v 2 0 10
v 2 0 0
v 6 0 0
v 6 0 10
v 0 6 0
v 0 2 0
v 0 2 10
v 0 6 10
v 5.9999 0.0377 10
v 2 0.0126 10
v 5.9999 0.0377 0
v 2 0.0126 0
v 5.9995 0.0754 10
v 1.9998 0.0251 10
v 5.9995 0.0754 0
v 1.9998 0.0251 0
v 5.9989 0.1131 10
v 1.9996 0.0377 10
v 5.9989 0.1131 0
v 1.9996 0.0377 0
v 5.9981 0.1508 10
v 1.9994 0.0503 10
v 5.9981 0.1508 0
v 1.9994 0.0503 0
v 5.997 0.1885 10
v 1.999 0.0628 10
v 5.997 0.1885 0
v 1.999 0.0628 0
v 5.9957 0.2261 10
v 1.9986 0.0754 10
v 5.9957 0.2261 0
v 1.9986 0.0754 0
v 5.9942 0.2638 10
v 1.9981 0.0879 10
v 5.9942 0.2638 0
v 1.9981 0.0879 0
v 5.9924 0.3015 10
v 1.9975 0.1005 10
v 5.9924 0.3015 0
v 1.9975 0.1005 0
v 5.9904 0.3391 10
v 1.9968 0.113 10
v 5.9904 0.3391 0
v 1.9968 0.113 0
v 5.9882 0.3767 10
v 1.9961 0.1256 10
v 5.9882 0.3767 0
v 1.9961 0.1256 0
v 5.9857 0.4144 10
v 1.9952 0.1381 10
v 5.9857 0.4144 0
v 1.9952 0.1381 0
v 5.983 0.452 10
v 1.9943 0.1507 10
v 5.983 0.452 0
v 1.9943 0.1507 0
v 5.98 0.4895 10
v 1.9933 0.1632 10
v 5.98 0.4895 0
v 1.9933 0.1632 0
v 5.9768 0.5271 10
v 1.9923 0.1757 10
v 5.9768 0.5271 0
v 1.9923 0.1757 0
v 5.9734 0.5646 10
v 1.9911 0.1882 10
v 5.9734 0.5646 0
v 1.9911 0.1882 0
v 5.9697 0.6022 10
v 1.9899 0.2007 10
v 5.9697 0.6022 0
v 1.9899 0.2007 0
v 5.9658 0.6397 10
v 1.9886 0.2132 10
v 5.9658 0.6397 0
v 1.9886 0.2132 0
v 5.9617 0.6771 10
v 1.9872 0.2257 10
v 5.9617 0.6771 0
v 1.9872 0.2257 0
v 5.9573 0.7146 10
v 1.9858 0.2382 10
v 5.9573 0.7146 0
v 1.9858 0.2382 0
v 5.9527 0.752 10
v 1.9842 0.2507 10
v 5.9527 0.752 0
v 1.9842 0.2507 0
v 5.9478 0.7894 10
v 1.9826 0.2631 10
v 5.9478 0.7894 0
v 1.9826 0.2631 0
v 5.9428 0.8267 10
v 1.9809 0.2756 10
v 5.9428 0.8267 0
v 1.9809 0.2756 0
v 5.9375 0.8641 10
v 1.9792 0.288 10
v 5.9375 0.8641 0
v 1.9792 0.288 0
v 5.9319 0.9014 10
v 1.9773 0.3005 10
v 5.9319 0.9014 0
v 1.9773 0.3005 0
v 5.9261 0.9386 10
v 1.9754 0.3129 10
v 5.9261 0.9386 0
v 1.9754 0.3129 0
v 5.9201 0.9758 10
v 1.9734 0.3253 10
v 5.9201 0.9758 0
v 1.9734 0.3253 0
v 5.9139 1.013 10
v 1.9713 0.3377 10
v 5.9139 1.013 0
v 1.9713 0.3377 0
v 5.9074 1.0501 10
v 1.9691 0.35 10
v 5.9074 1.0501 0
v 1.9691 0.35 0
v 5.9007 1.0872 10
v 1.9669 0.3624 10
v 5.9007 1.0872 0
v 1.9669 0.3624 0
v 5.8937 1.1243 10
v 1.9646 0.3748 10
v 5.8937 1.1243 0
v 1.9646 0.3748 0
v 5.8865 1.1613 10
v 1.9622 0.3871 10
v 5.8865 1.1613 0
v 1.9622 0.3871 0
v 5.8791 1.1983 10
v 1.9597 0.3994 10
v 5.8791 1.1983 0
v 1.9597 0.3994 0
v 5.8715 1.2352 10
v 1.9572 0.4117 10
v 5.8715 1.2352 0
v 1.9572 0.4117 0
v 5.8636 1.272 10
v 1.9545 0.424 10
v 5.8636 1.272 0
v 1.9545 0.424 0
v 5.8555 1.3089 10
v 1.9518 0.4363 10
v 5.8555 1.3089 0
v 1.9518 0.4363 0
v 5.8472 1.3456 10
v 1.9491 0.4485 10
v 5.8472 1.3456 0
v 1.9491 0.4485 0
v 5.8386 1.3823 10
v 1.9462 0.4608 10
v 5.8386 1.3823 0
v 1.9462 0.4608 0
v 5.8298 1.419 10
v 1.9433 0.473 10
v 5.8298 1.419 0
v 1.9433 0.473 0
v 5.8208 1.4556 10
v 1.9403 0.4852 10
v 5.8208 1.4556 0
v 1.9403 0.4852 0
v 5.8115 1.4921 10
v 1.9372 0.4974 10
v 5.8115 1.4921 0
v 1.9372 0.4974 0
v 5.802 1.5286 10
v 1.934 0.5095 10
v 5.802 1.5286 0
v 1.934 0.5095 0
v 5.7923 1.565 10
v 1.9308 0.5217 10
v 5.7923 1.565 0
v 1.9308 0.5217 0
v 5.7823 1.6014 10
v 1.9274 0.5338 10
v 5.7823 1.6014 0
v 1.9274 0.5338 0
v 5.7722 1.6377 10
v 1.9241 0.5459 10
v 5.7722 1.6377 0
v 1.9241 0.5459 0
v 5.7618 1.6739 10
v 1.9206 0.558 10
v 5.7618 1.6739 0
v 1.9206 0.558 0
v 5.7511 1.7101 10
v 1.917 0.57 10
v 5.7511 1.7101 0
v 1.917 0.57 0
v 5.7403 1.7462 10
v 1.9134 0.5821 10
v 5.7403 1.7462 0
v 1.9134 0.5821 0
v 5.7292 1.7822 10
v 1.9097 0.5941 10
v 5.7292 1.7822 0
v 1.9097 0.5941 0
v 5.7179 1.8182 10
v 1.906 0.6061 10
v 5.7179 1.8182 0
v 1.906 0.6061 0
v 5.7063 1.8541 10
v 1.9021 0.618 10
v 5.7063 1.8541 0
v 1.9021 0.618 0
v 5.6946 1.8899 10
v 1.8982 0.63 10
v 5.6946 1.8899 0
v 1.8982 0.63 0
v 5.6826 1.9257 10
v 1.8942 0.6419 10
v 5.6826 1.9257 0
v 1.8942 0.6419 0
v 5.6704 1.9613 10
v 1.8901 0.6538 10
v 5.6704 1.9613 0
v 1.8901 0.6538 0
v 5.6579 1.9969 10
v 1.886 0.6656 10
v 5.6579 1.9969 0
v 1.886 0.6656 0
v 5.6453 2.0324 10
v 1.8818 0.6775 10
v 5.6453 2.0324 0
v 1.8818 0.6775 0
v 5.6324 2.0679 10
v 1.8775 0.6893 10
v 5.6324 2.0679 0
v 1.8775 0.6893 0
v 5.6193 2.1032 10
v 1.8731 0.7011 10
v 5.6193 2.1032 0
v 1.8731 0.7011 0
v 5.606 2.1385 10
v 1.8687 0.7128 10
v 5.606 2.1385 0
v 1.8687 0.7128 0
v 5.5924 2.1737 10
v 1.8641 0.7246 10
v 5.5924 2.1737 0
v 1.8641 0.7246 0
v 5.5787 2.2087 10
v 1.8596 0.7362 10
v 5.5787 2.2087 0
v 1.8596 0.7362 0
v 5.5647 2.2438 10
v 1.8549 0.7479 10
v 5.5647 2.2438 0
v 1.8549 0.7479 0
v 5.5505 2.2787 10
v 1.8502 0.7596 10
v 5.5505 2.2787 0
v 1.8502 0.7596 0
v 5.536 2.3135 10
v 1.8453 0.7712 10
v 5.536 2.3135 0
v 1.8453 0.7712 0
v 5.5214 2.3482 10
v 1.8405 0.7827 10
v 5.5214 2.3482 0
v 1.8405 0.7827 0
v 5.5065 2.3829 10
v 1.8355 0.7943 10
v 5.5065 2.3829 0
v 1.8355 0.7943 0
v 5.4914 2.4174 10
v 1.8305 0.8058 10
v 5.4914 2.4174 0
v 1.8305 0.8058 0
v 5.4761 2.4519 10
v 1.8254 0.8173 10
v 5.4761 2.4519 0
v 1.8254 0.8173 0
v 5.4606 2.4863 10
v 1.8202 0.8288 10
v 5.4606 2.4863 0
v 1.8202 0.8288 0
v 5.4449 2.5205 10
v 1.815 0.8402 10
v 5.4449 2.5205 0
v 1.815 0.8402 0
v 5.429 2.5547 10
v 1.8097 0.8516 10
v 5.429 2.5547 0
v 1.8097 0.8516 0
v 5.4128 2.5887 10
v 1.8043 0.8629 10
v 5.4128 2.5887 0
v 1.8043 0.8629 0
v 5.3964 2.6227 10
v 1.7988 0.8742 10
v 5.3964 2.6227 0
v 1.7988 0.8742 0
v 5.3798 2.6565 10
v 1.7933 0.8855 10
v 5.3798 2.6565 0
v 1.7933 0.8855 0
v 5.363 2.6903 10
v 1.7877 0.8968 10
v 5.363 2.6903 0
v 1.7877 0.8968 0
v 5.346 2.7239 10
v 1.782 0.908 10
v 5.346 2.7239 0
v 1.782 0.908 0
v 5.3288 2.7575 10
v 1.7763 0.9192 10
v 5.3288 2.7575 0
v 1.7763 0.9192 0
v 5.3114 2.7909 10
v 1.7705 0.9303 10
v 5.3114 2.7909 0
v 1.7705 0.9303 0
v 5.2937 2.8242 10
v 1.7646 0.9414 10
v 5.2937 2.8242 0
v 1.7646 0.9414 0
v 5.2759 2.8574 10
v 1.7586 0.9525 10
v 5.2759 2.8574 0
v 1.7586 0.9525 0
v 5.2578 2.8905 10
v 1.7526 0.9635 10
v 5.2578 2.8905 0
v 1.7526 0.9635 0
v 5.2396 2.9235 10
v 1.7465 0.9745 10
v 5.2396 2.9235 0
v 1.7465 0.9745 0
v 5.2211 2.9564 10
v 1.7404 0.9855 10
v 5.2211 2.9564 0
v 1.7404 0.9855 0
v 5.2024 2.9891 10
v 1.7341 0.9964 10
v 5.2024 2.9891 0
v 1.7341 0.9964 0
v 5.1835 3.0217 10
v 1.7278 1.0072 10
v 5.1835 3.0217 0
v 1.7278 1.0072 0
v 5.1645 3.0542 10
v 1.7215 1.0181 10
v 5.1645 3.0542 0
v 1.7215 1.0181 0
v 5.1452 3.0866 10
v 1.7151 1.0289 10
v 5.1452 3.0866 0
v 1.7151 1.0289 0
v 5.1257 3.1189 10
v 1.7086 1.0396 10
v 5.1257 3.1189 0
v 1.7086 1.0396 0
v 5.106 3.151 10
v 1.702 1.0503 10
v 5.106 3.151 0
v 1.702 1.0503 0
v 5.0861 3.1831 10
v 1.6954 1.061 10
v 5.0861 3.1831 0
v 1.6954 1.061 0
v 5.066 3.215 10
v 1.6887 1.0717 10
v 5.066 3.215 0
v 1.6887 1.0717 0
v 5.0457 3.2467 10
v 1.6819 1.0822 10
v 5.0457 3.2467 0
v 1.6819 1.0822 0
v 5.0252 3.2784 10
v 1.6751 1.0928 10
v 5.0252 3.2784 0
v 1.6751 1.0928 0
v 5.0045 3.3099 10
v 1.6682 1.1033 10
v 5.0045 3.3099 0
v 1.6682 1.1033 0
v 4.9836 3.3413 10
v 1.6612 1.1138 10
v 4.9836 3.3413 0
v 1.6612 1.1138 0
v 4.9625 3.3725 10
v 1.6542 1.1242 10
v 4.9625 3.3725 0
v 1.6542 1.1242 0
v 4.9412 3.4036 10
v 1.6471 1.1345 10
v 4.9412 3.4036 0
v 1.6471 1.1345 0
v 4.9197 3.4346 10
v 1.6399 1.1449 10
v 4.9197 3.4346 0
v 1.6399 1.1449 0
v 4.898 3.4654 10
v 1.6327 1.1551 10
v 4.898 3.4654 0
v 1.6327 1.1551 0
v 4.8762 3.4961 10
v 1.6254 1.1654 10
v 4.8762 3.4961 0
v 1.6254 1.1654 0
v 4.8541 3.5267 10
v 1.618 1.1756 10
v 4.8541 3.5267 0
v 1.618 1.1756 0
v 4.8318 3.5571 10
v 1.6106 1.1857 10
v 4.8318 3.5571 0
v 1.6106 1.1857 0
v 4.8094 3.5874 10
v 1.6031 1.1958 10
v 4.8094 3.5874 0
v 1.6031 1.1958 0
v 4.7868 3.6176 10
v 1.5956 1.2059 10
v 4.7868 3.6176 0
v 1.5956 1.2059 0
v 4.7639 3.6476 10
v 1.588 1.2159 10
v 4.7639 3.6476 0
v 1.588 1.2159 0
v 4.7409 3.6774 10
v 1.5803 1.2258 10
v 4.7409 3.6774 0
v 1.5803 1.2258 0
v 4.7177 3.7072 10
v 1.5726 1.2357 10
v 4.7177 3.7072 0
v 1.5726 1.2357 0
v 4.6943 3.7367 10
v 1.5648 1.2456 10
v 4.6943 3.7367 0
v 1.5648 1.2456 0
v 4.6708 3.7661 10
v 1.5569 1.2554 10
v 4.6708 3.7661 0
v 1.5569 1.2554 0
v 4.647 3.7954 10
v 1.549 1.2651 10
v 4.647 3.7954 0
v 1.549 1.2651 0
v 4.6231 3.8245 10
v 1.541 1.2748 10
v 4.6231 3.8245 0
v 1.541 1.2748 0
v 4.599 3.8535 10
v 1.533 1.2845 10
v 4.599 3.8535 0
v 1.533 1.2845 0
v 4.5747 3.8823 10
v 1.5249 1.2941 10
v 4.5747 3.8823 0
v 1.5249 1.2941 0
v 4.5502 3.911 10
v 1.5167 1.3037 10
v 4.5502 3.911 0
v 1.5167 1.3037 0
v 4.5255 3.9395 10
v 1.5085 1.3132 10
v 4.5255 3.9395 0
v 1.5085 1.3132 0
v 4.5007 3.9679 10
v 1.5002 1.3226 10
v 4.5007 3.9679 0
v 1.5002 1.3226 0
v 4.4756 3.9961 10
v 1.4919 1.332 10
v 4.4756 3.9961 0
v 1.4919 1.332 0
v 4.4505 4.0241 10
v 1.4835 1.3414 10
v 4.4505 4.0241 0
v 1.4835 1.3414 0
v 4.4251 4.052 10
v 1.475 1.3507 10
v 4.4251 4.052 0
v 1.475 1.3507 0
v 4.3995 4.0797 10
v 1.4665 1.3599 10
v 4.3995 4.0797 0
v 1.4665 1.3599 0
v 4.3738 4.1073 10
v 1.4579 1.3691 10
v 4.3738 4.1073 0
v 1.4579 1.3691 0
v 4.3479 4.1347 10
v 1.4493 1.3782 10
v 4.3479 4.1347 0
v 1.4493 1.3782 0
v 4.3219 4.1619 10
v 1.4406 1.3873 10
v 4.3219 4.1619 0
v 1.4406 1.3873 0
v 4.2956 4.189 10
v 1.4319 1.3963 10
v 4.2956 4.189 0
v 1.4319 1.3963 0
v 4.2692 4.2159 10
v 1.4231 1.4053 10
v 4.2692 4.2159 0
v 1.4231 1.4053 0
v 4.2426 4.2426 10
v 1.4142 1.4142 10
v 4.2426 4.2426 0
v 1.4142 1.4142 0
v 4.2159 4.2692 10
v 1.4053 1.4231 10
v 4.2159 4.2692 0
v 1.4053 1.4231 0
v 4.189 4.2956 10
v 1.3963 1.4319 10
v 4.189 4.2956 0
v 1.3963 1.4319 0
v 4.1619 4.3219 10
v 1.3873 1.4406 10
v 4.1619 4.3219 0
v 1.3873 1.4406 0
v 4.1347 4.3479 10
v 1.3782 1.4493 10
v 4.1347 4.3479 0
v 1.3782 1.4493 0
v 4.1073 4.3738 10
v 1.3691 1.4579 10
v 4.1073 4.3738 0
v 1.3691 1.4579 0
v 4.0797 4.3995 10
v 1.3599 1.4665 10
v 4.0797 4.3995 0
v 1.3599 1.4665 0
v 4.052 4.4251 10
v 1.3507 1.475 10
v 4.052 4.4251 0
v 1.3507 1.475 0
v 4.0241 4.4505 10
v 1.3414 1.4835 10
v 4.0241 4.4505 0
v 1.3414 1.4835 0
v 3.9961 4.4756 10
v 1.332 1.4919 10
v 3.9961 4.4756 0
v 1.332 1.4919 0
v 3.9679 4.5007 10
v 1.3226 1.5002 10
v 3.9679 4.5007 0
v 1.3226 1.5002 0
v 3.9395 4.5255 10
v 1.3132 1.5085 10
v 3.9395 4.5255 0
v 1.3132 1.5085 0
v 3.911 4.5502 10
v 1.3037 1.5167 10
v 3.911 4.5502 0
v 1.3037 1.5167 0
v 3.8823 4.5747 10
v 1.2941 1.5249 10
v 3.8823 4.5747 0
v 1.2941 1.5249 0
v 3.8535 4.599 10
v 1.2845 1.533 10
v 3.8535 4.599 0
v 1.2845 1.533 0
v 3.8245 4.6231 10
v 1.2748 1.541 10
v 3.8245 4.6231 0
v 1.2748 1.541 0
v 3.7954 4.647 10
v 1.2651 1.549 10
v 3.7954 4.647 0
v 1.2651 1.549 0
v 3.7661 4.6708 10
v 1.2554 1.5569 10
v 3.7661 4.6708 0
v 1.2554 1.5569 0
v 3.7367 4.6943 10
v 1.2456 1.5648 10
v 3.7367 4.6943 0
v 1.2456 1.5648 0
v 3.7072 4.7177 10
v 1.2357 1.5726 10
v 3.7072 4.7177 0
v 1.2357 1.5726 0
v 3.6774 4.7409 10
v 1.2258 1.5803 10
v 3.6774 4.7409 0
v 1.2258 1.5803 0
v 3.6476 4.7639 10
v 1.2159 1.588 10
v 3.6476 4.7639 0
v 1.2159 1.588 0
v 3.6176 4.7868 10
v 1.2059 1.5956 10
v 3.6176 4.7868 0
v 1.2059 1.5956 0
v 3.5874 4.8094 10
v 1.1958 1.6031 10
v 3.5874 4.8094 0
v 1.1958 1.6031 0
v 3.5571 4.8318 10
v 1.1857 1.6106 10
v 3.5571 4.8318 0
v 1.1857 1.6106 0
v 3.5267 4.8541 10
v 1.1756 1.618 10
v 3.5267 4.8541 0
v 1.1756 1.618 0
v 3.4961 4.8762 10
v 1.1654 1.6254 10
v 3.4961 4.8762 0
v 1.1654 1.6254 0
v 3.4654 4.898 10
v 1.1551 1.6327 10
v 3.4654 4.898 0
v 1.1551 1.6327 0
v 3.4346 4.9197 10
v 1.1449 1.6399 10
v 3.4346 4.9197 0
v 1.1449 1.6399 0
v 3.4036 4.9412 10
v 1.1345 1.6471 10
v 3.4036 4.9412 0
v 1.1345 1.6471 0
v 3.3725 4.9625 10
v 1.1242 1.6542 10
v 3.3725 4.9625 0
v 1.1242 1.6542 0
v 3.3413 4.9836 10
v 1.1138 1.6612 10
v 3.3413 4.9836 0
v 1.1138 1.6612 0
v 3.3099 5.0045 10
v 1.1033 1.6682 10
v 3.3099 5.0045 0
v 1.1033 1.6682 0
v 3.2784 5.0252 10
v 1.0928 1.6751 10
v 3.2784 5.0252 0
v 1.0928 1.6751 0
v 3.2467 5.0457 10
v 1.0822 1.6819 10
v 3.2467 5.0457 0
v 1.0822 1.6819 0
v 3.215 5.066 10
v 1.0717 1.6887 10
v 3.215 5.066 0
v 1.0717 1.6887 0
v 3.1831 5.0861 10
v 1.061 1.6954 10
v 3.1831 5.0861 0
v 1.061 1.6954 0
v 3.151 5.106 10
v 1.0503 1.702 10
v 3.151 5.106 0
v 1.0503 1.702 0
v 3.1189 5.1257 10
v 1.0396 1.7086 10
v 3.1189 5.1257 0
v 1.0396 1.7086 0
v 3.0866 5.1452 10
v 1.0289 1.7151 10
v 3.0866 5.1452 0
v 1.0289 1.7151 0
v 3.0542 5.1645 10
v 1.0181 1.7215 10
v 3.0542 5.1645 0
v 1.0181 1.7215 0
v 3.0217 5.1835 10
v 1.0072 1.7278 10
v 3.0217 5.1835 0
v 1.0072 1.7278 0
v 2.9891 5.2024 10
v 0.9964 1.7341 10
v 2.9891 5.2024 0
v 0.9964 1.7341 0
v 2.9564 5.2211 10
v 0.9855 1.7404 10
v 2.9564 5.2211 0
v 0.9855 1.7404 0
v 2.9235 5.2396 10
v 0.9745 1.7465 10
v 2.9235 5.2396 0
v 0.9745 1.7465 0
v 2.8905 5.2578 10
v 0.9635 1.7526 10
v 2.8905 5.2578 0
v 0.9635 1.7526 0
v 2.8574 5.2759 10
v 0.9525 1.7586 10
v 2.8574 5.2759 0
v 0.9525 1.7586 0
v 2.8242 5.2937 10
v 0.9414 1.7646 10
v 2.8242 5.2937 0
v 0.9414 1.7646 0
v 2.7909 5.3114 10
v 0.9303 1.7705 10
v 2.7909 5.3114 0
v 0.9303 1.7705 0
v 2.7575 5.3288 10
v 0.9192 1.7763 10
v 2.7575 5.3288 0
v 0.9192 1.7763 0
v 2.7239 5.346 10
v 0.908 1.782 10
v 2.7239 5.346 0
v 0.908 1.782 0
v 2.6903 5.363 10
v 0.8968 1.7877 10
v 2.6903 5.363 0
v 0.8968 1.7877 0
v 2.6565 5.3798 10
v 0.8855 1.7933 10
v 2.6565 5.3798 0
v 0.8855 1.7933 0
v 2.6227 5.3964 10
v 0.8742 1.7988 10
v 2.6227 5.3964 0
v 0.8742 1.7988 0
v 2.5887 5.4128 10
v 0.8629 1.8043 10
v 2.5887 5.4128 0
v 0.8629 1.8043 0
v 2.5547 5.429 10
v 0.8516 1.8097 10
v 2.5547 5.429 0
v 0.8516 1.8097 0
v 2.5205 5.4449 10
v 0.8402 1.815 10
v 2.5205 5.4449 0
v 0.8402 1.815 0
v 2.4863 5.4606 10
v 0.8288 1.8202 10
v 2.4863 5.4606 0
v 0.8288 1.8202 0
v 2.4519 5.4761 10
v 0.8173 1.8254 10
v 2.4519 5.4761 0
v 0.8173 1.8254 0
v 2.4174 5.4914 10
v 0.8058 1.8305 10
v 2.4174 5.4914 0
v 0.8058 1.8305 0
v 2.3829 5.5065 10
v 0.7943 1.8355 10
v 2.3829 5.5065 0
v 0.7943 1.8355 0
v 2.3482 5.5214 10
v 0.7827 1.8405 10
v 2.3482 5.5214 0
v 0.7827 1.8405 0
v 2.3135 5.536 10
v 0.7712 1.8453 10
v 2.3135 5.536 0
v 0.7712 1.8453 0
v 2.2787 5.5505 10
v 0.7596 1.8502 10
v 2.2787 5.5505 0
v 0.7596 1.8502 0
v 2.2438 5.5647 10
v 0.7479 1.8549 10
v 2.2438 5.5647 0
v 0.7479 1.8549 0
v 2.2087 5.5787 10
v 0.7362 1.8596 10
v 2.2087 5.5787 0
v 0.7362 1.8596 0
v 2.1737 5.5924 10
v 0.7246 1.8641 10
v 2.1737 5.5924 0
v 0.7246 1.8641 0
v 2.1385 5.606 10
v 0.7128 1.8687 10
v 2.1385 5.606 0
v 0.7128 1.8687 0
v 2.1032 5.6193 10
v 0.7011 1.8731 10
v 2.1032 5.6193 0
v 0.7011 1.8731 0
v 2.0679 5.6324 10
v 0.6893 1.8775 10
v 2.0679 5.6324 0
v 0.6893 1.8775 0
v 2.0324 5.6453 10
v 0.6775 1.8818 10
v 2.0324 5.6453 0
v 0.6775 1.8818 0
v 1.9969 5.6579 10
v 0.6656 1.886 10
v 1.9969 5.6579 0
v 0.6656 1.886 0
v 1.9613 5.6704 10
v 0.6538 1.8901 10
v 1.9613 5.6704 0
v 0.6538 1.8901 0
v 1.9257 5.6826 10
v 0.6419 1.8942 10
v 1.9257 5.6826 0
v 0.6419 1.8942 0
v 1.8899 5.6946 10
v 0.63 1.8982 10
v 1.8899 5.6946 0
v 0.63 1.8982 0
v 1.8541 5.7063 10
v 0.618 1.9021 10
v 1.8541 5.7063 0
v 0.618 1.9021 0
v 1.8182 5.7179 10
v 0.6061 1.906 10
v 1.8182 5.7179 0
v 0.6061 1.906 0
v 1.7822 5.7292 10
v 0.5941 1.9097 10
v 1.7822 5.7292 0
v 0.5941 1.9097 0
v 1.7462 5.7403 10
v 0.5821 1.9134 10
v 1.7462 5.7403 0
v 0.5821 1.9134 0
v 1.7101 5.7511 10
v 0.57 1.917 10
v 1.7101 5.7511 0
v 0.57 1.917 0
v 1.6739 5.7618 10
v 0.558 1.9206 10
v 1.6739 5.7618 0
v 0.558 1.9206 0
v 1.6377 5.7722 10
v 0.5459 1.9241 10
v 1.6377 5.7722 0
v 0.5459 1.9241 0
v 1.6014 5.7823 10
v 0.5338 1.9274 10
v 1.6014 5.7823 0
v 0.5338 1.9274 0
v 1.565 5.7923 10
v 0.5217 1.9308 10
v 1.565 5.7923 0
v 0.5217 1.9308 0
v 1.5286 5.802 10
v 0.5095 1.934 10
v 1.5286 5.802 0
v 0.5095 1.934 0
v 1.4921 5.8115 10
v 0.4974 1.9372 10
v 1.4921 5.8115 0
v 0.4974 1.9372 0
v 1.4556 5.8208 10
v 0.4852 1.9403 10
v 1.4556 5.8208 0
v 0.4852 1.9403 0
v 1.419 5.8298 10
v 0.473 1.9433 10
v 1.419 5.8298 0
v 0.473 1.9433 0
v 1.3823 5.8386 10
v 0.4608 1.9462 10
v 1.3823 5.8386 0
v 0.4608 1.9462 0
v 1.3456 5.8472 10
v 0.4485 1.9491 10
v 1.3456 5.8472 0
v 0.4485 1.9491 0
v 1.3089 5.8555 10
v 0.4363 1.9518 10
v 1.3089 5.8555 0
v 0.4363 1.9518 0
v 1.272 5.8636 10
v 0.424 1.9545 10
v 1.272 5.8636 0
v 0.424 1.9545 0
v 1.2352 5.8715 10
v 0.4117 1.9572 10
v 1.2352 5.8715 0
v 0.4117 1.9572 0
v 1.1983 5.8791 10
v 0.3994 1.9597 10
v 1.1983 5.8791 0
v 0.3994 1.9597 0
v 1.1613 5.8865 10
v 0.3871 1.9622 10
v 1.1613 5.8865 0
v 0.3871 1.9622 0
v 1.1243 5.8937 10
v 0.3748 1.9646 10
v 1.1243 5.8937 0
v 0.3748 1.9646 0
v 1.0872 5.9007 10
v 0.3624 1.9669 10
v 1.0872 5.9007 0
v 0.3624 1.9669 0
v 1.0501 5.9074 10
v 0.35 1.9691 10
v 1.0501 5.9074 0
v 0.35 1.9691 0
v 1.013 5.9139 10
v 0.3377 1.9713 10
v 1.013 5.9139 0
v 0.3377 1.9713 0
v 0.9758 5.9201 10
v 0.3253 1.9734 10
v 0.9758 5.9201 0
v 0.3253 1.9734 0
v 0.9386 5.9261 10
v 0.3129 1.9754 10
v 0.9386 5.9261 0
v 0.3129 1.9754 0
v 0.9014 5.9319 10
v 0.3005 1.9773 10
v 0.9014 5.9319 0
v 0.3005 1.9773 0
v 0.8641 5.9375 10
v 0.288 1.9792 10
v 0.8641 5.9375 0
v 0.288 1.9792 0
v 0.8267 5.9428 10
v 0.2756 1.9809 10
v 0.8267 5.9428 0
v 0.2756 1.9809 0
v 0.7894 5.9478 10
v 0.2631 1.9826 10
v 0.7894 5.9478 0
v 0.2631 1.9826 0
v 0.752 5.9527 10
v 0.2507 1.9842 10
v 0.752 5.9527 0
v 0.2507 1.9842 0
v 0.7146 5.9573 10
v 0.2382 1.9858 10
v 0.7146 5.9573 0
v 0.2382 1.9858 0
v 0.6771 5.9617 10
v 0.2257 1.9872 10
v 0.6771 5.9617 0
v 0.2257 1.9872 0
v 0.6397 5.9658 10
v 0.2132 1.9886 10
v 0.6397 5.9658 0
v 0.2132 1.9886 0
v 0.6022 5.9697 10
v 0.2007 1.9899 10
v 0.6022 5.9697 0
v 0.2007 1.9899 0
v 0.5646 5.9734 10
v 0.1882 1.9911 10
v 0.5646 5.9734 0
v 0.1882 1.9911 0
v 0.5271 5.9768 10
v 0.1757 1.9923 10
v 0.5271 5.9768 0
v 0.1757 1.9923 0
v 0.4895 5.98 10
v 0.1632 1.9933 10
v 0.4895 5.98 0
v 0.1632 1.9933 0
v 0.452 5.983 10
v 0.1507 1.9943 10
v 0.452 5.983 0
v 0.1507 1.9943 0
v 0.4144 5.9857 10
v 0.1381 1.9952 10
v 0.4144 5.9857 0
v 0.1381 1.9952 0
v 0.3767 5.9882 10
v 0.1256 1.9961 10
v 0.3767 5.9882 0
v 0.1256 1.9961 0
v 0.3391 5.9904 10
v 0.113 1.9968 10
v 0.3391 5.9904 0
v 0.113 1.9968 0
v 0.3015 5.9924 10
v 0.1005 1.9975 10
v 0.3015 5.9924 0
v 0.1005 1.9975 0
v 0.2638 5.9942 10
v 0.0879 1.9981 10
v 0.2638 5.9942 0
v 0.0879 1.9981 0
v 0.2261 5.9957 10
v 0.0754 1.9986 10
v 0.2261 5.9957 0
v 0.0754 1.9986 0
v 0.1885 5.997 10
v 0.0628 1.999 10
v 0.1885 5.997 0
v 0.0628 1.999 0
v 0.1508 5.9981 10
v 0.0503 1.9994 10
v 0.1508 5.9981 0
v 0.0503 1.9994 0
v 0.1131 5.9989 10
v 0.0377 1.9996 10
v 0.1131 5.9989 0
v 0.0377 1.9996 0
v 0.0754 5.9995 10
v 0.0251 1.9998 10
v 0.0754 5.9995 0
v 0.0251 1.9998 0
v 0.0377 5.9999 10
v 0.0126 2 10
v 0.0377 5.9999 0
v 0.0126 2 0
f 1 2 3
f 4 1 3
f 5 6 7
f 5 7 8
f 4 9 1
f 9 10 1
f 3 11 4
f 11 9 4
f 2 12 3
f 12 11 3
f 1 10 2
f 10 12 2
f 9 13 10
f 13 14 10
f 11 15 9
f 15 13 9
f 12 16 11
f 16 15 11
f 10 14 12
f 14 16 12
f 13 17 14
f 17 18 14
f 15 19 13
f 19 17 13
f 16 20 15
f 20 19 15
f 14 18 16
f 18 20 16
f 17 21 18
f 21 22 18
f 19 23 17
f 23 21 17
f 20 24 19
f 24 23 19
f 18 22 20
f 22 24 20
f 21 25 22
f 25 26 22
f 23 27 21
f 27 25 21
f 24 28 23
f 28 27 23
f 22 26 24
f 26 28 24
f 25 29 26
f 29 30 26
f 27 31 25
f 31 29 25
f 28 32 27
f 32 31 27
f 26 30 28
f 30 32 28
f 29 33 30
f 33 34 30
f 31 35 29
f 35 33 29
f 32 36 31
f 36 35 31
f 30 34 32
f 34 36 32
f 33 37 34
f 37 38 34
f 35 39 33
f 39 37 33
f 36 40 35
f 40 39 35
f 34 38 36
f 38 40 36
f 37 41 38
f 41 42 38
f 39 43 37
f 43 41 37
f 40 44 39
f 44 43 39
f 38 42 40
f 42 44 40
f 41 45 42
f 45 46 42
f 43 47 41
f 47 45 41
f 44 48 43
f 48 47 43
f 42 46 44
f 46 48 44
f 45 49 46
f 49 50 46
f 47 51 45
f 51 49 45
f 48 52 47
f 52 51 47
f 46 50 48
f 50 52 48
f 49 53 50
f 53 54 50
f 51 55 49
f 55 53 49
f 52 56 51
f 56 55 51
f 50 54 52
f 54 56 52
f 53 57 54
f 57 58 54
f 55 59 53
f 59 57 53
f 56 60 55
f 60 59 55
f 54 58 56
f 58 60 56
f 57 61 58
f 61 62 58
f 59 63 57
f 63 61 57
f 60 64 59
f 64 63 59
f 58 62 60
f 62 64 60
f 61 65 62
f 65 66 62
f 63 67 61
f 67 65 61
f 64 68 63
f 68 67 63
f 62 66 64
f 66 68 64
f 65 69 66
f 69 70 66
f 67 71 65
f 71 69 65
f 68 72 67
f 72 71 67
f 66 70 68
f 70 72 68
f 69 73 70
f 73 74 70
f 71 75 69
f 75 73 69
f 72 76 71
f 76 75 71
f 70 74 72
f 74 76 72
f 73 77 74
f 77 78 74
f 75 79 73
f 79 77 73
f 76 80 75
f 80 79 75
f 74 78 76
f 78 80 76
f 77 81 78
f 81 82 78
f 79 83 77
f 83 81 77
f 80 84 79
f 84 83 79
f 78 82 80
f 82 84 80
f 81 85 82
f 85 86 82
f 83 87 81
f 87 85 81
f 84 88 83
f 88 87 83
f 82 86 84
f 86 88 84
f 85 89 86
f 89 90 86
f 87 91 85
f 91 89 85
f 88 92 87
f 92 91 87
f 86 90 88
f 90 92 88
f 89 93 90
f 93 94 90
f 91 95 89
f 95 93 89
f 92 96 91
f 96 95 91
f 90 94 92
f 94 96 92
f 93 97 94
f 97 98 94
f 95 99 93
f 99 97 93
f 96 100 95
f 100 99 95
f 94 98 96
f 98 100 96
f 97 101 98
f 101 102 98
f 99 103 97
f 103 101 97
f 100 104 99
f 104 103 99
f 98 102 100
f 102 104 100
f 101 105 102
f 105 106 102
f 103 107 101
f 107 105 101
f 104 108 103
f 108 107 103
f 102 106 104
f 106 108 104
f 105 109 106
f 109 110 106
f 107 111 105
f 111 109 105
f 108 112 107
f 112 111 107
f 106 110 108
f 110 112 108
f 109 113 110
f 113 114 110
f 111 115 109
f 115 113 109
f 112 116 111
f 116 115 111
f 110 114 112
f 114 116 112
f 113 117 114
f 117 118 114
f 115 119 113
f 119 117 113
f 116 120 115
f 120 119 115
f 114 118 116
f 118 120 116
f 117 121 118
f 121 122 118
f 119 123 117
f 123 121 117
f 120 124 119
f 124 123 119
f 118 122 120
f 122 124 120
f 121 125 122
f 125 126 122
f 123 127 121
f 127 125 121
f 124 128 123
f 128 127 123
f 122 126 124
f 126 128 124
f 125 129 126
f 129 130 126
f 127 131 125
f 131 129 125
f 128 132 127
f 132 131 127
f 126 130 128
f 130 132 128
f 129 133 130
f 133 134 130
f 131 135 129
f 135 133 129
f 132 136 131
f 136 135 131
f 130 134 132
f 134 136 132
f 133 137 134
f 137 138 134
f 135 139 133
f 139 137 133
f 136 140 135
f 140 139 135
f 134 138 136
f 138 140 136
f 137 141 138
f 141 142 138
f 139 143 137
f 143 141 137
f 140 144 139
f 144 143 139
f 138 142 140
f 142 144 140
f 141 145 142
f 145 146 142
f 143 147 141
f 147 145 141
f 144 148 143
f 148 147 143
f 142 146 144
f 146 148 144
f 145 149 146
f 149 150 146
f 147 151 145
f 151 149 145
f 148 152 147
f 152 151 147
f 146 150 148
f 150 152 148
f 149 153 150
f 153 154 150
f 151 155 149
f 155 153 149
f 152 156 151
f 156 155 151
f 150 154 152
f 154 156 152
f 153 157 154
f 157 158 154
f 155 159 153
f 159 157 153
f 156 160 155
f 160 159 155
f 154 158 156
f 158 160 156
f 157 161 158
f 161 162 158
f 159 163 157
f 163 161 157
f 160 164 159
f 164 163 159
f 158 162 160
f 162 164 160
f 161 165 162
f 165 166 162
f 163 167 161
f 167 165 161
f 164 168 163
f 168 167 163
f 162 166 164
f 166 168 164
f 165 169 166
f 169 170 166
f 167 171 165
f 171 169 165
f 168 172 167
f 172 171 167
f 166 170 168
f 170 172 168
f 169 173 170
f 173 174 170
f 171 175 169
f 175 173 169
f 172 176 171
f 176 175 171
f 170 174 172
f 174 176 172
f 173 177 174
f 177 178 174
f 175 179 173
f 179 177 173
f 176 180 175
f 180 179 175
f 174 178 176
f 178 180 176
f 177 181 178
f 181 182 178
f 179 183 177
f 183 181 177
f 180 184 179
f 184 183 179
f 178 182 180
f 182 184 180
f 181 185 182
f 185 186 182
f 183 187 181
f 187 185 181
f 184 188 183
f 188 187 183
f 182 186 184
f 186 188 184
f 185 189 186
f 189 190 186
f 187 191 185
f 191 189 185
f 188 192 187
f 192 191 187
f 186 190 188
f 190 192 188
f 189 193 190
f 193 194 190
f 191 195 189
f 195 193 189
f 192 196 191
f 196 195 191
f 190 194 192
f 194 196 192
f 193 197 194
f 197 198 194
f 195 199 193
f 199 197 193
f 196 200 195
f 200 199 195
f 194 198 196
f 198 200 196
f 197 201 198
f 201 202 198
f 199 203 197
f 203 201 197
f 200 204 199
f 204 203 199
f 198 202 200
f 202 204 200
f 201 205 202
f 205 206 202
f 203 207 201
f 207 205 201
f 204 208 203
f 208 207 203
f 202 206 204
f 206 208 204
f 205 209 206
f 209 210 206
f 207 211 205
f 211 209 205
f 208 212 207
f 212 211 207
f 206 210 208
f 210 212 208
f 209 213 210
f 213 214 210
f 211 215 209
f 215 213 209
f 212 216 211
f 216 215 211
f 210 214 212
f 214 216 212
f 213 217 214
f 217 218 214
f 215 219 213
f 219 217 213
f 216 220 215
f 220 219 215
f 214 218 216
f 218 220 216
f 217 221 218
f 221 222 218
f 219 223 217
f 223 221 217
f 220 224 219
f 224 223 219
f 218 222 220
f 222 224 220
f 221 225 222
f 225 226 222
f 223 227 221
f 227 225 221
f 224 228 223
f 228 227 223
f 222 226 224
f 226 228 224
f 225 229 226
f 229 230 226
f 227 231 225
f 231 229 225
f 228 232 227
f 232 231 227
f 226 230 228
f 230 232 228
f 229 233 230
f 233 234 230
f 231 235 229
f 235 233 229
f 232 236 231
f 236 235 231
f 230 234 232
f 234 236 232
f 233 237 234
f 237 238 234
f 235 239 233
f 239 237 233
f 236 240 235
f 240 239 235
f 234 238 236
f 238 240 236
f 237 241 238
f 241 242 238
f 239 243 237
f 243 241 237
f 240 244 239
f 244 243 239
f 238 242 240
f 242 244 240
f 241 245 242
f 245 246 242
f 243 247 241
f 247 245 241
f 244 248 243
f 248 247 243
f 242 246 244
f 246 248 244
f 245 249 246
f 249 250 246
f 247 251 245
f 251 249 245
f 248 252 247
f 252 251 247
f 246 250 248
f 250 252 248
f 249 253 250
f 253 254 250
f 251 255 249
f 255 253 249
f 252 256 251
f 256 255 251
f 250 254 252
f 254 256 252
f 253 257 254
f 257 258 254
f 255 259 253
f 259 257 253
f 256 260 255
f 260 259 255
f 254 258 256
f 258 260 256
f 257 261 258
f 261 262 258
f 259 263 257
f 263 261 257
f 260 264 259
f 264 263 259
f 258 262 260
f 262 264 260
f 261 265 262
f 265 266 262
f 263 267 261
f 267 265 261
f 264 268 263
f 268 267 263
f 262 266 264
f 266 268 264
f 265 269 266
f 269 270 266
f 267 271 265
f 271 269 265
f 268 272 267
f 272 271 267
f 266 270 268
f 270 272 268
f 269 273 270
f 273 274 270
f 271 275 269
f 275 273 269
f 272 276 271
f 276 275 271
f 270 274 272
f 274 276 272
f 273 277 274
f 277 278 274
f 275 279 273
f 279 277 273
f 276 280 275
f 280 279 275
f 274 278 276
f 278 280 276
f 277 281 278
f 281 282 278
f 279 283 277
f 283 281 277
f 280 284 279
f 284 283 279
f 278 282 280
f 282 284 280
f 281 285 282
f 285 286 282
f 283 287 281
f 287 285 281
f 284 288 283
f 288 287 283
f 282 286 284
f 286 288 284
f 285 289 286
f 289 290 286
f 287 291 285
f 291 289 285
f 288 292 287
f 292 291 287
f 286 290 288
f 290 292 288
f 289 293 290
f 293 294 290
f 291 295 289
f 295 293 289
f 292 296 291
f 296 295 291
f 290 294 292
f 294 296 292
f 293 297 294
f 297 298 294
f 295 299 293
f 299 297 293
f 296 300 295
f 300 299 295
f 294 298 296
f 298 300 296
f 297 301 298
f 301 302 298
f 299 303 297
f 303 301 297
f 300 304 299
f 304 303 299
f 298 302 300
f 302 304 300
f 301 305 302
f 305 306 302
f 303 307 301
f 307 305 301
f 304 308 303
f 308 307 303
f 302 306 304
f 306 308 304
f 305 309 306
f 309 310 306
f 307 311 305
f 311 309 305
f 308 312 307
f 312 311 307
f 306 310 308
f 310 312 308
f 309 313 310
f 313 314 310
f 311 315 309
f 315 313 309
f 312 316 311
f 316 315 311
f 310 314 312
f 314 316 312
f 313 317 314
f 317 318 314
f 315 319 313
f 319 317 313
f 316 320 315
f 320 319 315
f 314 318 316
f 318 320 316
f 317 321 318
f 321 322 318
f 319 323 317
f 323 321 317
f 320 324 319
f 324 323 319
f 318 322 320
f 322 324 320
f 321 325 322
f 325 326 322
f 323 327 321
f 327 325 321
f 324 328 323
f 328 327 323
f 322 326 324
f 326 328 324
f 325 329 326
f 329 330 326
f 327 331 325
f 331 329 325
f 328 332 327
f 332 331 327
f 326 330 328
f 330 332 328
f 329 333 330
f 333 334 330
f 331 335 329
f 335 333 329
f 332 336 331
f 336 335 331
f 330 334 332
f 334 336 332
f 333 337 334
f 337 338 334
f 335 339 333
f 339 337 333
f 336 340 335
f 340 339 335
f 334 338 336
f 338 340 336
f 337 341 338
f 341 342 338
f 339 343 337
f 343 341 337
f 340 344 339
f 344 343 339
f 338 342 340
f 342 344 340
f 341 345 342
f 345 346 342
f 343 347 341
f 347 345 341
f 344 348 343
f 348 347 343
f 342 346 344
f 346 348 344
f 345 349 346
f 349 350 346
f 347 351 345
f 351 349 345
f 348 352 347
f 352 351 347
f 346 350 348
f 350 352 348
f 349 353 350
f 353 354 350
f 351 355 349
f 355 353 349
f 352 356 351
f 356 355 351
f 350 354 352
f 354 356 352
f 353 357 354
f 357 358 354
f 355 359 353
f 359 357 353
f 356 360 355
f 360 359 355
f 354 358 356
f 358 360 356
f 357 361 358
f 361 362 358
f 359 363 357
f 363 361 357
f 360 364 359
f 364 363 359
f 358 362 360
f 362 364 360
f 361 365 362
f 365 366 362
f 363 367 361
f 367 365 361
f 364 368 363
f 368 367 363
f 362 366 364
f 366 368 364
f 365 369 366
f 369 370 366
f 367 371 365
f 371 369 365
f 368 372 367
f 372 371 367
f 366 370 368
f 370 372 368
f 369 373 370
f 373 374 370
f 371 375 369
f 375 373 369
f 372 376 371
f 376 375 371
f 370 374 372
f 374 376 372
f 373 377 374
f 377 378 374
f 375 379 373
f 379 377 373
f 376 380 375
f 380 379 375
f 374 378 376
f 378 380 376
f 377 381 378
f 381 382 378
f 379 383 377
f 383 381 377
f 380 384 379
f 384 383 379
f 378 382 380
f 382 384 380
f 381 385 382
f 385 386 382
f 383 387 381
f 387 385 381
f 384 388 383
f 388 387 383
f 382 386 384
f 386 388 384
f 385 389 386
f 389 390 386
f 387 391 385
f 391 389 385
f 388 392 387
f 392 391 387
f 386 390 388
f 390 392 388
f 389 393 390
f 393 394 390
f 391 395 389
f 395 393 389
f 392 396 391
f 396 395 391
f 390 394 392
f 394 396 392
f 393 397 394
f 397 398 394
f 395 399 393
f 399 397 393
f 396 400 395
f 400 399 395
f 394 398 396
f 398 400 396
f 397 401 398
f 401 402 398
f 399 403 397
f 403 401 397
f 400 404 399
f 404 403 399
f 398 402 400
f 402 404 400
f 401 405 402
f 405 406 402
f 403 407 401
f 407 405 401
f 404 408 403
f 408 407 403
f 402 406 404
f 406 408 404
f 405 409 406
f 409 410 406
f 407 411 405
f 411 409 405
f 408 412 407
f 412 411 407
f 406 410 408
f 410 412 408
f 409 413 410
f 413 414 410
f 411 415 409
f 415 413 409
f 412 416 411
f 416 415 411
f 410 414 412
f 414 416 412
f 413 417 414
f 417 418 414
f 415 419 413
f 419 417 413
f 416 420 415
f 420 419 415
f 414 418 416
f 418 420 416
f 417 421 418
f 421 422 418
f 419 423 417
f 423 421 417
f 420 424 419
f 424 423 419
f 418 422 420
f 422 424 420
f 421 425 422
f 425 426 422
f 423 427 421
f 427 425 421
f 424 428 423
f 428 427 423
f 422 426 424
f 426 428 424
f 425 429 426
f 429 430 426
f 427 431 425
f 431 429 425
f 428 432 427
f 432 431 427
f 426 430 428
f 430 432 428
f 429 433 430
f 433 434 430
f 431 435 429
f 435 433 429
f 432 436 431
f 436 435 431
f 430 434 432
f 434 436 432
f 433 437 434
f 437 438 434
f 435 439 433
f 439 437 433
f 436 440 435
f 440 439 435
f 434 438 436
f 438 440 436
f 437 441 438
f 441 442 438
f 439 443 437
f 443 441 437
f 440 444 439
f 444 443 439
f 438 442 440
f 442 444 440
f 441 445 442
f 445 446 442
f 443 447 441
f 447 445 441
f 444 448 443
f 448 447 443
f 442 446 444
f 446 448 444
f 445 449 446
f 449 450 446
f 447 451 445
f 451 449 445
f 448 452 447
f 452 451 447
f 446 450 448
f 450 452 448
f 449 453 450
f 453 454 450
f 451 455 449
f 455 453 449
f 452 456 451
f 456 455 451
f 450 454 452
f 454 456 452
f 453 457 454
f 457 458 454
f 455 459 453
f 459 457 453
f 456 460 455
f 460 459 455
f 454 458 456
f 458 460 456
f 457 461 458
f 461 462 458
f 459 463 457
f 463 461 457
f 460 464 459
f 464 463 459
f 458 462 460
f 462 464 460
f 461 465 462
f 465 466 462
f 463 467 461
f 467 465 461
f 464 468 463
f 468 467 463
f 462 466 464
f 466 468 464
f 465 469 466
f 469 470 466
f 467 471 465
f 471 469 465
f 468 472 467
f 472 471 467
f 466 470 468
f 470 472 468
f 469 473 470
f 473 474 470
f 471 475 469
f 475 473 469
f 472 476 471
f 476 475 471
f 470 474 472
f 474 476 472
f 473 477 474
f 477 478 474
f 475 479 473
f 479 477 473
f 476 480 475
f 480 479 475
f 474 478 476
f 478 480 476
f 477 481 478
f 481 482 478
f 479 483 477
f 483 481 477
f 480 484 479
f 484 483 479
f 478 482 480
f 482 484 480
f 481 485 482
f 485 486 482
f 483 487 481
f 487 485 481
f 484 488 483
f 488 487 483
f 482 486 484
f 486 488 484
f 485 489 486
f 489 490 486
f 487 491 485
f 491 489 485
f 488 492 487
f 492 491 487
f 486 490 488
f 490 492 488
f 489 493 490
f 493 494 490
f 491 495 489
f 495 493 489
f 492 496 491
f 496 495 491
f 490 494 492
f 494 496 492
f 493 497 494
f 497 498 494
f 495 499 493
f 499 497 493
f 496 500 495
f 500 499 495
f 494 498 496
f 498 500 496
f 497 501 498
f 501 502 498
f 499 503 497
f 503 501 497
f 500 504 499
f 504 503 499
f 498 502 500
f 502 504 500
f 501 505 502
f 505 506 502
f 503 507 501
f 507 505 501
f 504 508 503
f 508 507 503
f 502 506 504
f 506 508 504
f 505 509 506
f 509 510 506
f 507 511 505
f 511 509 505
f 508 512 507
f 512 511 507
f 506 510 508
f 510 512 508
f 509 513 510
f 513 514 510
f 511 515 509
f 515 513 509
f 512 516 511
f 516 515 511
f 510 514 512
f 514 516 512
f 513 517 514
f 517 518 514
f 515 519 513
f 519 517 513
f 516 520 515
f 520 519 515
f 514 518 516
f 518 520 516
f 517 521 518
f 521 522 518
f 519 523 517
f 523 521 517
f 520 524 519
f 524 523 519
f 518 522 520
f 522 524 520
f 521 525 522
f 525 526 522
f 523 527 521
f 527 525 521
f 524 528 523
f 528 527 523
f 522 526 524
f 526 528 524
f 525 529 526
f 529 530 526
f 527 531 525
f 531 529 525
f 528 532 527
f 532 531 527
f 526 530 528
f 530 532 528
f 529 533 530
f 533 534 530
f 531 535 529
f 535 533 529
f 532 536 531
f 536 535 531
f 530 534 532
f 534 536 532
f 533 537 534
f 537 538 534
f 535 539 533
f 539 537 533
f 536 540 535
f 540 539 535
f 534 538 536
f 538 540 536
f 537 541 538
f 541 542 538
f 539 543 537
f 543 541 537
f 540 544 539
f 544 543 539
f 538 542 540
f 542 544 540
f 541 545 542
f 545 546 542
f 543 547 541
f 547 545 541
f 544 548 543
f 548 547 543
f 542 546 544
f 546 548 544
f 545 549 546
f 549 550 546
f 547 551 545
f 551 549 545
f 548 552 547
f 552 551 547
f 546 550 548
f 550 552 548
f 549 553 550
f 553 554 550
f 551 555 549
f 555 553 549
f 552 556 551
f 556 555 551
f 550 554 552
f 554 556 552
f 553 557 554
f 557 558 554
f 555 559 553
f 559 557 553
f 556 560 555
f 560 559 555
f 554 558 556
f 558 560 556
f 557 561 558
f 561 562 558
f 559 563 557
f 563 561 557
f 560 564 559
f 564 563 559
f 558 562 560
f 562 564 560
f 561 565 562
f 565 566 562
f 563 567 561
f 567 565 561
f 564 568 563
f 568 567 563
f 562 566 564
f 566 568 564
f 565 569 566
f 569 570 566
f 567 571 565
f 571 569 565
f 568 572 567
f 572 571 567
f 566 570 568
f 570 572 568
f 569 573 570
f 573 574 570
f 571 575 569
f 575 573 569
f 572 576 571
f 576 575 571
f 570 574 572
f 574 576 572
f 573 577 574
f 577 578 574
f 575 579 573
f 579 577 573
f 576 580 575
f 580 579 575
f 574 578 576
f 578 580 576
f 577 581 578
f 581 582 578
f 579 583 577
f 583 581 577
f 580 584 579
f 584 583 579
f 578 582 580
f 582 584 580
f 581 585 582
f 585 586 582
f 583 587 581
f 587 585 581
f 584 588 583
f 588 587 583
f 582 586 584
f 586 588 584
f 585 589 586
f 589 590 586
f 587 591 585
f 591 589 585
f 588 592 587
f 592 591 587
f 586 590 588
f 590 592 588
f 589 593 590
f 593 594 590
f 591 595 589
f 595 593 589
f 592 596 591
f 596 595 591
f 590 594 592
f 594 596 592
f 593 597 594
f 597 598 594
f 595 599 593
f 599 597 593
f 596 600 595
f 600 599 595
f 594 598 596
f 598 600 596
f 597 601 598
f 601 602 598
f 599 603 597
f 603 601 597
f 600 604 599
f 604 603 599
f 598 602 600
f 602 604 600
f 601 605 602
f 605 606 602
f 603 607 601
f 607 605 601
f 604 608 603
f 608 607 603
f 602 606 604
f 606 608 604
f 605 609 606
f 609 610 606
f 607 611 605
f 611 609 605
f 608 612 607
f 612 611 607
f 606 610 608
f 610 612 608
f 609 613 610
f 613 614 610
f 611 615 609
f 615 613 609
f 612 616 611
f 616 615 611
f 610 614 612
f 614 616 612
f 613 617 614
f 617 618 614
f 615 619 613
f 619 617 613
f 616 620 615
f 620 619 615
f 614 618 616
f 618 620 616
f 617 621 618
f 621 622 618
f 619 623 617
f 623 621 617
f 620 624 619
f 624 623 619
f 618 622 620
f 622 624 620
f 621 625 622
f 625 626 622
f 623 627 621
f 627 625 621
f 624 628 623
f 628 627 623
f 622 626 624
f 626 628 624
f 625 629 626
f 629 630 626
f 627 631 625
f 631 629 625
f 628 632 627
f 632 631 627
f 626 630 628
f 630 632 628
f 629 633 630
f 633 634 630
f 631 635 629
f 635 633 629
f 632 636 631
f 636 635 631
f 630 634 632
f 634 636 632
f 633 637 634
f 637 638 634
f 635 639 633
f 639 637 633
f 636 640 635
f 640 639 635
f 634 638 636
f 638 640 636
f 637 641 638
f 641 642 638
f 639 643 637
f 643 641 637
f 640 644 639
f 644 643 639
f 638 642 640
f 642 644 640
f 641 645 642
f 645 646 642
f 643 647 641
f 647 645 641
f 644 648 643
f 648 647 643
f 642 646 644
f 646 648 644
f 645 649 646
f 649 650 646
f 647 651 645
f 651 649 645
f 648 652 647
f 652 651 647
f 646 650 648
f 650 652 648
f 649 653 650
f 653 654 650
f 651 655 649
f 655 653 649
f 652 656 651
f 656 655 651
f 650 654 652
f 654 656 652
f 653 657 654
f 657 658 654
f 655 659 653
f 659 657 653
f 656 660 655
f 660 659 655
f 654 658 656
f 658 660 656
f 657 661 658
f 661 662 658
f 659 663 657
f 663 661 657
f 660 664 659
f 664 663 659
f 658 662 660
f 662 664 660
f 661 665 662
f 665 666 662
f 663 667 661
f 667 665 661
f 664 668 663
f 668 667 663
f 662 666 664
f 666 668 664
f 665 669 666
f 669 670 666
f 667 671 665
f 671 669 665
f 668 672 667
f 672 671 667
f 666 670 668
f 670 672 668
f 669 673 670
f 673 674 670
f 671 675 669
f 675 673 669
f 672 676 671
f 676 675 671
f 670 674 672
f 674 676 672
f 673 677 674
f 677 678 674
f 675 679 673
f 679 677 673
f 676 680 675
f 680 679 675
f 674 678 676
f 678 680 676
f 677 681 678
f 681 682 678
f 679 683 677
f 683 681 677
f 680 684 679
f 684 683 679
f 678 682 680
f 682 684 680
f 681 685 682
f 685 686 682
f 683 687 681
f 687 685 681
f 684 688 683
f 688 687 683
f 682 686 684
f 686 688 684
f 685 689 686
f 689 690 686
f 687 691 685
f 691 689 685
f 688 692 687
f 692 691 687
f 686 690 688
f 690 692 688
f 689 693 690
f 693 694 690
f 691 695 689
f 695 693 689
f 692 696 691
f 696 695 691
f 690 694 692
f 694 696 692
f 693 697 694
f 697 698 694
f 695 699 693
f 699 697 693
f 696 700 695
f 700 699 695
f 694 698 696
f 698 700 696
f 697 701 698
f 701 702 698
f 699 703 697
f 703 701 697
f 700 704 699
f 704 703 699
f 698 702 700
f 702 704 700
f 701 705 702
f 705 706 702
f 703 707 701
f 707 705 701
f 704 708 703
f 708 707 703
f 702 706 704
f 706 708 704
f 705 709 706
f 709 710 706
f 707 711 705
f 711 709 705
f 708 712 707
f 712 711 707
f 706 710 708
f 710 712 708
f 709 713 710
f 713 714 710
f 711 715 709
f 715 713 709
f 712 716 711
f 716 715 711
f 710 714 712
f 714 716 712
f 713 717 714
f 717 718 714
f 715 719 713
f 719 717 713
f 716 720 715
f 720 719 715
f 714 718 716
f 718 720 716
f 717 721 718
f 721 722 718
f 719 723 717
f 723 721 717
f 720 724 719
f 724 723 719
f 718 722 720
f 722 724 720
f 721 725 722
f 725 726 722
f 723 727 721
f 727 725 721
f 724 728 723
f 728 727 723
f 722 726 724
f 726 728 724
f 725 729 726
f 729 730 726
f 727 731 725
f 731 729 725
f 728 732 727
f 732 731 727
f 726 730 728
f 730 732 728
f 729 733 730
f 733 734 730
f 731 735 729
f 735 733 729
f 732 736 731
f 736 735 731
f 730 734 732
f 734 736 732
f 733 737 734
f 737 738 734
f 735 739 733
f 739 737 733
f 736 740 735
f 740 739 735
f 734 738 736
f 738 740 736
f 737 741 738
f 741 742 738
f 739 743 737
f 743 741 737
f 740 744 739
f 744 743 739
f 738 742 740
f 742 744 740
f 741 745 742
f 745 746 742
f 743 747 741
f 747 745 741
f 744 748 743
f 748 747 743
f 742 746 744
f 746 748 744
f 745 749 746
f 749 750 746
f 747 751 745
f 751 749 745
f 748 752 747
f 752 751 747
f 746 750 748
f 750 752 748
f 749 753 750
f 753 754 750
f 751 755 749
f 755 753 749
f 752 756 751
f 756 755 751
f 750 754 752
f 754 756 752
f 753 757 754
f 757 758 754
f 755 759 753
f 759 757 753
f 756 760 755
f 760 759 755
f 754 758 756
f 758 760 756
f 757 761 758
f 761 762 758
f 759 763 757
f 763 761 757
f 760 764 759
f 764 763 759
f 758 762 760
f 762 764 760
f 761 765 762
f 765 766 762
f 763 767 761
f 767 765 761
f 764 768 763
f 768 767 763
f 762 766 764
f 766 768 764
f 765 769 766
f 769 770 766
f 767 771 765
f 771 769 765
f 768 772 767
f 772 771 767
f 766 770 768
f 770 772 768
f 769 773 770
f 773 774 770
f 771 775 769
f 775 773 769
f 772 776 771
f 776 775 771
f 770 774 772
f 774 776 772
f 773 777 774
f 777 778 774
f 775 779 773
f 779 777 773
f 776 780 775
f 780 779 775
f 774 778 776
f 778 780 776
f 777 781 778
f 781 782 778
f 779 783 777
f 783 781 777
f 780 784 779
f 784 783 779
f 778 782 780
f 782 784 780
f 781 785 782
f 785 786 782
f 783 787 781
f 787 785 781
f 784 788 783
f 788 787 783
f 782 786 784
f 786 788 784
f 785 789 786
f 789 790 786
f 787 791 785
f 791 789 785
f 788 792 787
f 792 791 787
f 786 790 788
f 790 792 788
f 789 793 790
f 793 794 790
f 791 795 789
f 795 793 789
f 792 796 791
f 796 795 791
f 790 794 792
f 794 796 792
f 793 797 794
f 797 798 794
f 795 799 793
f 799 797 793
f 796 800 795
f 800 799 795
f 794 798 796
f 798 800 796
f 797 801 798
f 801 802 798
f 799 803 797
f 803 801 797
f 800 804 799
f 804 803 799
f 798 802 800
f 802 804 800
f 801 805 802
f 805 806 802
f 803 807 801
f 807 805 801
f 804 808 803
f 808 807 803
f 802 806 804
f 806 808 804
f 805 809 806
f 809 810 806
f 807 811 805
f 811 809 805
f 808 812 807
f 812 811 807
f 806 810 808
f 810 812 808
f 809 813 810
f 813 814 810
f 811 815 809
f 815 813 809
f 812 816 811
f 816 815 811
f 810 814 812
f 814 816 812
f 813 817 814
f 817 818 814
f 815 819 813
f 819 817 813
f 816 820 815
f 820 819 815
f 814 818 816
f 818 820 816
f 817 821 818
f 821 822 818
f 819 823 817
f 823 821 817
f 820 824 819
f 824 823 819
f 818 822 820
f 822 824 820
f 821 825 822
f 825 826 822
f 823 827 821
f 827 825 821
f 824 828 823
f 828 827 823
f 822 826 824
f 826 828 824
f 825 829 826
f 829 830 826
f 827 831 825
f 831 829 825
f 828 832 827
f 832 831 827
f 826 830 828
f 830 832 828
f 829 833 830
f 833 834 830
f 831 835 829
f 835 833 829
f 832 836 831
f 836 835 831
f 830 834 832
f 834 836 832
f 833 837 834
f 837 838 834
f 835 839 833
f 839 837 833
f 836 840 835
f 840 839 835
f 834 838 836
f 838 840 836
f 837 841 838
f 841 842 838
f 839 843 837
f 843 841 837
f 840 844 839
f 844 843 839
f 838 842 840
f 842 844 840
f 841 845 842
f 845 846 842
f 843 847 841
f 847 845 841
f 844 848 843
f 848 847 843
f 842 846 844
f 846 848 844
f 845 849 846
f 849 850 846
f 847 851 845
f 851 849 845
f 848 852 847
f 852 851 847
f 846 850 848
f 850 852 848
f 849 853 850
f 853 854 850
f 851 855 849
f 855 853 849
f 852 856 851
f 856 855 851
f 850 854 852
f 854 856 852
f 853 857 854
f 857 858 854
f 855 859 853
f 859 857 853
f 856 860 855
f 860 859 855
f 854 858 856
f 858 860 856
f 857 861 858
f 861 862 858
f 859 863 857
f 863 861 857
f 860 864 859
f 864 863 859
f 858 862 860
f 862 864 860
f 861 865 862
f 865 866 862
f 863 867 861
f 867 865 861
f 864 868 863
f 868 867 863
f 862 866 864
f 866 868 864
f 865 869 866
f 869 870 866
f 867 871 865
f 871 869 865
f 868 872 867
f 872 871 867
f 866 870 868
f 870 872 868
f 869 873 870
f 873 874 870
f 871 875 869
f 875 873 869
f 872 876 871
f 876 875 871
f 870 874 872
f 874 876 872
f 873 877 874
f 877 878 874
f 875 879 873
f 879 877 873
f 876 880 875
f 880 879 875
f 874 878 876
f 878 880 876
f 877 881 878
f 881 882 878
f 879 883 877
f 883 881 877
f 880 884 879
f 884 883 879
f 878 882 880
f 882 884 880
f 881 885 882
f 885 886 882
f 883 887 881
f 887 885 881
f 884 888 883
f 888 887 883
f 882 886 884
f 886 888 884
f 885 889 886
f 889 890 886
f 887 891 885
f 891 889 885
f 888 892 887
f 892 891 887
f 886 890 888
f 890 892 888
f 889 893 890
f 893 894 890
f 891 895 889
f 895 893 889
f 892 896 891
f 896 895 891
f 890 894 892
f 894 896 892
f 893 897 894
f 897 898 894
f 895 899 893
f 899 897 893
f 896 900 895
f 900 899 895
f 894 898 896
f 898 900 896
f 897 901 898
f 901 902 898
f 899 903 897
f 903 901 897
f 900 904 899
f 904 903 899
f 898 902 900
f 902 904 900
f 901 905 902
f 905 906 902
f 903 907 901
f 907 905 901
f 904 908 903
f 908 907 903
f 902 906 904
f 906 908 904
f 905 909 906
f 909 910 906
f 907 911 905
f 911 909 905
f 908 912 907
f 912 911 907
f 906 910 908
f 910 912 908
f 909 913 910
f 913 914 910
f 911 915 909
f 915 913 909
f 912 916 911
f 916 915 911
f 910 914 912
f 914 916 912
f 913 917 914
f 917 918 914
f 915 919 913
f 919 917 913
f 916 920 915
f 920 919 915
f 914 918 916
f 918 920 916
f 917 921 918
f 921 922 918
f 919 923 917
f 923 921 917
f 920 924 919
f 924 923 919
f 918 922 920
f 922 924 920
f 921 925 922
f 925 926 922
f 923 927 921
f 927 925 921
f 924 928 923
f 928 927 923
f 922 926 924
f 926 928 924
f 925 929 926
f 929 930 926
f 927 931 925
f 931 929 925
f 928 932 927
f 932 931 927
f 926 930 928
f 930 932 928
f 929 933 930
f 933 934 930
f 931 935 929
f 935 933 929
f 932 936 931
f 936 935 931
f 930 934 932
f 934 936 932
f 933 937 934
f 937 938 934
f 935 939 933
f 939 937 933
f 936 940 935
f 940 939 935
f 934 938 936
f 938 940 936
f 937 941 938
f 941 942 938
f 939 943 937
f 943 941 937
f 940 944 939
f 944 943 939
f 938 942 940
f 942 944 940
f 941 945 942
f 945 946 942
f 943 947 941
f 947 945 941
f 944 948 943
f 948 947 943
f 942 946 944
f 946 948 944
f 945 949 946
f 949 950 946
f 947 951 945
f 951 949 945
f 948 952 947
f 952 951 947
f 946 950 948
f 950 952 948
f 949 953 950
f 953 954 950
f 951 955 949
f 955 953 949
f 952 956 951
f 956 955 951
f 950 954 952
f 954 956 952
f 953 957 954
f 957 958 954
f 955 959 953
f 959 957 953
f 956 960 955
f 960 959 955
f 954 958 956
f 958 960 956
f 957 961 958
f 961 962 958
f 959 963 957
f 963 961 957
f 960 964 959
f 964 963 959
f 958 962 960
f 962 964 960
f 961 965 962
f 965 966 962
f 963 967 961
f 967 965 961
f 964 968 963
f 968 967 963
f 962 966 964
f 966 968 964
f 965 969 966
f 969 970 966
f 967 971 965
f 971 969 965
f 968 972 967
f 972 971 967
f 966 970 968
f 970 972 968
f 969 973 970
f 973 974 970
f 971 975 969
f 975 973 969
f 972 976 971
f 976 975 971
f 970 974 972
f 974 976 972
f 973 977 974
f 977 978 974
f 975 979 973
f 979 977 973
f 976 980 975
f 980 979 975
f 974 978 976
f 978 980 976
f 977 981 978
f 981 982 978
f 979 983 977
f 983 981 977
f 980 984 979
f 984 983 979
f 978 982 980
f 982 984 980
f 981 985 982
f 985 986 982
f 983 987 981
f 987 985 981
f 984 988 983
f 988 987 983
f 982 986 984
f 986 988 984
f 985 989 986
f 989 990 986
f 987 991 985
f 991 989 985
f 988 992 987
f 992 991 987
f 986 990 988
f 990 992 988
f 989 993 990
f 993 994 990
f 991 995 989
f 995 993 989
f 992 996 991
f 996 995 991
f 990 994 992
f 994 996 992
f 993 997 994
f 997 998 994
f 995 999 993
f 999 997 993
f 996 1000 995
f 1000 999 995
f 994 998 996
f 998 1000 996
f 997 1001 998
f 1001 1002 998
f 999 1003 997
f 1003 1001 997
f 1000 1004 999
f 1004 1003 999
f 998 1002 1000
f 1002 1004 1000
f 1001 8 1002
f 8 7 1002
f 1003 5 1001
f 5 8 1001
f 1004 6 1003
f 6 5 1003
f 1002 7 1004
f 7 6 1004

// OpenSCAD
// This is a general purpose bend module

// First, input the variables that we will use:

r = 2; // Inside radius
w = 10; // Width of piece of metal to be bent
b = 1; // Bend allowance for your piece of metal
a = 90; // Bend angle
t = 4; // Thickness of the metal
$fn= 1000; // This tells the compiler the maximum number of faces of a surface.



module bend(){
    
    rotate_extrude(angle = a, convexity = 2)
    translate([r,0,0])
    square([t,w]);
    
}



// In 2D models, shorten what ever piece is being bent by the bend radius. When you bend it on a brake or with a jig, it will stretch to size desired.


// For 3D models, the wings on each side of the bend need to be shortened by a certain amount, but then translated outward by that same amount so that they marry with the bend module. For 90 degree bends, that amount is sqrt(r^2/2). Bend allowance is a negative linear quanitity in flat parts before they are bent. When you are drawing in 3D, you have to calculate how much space the bend will take up and factor that in the parts around it. 

bend();
